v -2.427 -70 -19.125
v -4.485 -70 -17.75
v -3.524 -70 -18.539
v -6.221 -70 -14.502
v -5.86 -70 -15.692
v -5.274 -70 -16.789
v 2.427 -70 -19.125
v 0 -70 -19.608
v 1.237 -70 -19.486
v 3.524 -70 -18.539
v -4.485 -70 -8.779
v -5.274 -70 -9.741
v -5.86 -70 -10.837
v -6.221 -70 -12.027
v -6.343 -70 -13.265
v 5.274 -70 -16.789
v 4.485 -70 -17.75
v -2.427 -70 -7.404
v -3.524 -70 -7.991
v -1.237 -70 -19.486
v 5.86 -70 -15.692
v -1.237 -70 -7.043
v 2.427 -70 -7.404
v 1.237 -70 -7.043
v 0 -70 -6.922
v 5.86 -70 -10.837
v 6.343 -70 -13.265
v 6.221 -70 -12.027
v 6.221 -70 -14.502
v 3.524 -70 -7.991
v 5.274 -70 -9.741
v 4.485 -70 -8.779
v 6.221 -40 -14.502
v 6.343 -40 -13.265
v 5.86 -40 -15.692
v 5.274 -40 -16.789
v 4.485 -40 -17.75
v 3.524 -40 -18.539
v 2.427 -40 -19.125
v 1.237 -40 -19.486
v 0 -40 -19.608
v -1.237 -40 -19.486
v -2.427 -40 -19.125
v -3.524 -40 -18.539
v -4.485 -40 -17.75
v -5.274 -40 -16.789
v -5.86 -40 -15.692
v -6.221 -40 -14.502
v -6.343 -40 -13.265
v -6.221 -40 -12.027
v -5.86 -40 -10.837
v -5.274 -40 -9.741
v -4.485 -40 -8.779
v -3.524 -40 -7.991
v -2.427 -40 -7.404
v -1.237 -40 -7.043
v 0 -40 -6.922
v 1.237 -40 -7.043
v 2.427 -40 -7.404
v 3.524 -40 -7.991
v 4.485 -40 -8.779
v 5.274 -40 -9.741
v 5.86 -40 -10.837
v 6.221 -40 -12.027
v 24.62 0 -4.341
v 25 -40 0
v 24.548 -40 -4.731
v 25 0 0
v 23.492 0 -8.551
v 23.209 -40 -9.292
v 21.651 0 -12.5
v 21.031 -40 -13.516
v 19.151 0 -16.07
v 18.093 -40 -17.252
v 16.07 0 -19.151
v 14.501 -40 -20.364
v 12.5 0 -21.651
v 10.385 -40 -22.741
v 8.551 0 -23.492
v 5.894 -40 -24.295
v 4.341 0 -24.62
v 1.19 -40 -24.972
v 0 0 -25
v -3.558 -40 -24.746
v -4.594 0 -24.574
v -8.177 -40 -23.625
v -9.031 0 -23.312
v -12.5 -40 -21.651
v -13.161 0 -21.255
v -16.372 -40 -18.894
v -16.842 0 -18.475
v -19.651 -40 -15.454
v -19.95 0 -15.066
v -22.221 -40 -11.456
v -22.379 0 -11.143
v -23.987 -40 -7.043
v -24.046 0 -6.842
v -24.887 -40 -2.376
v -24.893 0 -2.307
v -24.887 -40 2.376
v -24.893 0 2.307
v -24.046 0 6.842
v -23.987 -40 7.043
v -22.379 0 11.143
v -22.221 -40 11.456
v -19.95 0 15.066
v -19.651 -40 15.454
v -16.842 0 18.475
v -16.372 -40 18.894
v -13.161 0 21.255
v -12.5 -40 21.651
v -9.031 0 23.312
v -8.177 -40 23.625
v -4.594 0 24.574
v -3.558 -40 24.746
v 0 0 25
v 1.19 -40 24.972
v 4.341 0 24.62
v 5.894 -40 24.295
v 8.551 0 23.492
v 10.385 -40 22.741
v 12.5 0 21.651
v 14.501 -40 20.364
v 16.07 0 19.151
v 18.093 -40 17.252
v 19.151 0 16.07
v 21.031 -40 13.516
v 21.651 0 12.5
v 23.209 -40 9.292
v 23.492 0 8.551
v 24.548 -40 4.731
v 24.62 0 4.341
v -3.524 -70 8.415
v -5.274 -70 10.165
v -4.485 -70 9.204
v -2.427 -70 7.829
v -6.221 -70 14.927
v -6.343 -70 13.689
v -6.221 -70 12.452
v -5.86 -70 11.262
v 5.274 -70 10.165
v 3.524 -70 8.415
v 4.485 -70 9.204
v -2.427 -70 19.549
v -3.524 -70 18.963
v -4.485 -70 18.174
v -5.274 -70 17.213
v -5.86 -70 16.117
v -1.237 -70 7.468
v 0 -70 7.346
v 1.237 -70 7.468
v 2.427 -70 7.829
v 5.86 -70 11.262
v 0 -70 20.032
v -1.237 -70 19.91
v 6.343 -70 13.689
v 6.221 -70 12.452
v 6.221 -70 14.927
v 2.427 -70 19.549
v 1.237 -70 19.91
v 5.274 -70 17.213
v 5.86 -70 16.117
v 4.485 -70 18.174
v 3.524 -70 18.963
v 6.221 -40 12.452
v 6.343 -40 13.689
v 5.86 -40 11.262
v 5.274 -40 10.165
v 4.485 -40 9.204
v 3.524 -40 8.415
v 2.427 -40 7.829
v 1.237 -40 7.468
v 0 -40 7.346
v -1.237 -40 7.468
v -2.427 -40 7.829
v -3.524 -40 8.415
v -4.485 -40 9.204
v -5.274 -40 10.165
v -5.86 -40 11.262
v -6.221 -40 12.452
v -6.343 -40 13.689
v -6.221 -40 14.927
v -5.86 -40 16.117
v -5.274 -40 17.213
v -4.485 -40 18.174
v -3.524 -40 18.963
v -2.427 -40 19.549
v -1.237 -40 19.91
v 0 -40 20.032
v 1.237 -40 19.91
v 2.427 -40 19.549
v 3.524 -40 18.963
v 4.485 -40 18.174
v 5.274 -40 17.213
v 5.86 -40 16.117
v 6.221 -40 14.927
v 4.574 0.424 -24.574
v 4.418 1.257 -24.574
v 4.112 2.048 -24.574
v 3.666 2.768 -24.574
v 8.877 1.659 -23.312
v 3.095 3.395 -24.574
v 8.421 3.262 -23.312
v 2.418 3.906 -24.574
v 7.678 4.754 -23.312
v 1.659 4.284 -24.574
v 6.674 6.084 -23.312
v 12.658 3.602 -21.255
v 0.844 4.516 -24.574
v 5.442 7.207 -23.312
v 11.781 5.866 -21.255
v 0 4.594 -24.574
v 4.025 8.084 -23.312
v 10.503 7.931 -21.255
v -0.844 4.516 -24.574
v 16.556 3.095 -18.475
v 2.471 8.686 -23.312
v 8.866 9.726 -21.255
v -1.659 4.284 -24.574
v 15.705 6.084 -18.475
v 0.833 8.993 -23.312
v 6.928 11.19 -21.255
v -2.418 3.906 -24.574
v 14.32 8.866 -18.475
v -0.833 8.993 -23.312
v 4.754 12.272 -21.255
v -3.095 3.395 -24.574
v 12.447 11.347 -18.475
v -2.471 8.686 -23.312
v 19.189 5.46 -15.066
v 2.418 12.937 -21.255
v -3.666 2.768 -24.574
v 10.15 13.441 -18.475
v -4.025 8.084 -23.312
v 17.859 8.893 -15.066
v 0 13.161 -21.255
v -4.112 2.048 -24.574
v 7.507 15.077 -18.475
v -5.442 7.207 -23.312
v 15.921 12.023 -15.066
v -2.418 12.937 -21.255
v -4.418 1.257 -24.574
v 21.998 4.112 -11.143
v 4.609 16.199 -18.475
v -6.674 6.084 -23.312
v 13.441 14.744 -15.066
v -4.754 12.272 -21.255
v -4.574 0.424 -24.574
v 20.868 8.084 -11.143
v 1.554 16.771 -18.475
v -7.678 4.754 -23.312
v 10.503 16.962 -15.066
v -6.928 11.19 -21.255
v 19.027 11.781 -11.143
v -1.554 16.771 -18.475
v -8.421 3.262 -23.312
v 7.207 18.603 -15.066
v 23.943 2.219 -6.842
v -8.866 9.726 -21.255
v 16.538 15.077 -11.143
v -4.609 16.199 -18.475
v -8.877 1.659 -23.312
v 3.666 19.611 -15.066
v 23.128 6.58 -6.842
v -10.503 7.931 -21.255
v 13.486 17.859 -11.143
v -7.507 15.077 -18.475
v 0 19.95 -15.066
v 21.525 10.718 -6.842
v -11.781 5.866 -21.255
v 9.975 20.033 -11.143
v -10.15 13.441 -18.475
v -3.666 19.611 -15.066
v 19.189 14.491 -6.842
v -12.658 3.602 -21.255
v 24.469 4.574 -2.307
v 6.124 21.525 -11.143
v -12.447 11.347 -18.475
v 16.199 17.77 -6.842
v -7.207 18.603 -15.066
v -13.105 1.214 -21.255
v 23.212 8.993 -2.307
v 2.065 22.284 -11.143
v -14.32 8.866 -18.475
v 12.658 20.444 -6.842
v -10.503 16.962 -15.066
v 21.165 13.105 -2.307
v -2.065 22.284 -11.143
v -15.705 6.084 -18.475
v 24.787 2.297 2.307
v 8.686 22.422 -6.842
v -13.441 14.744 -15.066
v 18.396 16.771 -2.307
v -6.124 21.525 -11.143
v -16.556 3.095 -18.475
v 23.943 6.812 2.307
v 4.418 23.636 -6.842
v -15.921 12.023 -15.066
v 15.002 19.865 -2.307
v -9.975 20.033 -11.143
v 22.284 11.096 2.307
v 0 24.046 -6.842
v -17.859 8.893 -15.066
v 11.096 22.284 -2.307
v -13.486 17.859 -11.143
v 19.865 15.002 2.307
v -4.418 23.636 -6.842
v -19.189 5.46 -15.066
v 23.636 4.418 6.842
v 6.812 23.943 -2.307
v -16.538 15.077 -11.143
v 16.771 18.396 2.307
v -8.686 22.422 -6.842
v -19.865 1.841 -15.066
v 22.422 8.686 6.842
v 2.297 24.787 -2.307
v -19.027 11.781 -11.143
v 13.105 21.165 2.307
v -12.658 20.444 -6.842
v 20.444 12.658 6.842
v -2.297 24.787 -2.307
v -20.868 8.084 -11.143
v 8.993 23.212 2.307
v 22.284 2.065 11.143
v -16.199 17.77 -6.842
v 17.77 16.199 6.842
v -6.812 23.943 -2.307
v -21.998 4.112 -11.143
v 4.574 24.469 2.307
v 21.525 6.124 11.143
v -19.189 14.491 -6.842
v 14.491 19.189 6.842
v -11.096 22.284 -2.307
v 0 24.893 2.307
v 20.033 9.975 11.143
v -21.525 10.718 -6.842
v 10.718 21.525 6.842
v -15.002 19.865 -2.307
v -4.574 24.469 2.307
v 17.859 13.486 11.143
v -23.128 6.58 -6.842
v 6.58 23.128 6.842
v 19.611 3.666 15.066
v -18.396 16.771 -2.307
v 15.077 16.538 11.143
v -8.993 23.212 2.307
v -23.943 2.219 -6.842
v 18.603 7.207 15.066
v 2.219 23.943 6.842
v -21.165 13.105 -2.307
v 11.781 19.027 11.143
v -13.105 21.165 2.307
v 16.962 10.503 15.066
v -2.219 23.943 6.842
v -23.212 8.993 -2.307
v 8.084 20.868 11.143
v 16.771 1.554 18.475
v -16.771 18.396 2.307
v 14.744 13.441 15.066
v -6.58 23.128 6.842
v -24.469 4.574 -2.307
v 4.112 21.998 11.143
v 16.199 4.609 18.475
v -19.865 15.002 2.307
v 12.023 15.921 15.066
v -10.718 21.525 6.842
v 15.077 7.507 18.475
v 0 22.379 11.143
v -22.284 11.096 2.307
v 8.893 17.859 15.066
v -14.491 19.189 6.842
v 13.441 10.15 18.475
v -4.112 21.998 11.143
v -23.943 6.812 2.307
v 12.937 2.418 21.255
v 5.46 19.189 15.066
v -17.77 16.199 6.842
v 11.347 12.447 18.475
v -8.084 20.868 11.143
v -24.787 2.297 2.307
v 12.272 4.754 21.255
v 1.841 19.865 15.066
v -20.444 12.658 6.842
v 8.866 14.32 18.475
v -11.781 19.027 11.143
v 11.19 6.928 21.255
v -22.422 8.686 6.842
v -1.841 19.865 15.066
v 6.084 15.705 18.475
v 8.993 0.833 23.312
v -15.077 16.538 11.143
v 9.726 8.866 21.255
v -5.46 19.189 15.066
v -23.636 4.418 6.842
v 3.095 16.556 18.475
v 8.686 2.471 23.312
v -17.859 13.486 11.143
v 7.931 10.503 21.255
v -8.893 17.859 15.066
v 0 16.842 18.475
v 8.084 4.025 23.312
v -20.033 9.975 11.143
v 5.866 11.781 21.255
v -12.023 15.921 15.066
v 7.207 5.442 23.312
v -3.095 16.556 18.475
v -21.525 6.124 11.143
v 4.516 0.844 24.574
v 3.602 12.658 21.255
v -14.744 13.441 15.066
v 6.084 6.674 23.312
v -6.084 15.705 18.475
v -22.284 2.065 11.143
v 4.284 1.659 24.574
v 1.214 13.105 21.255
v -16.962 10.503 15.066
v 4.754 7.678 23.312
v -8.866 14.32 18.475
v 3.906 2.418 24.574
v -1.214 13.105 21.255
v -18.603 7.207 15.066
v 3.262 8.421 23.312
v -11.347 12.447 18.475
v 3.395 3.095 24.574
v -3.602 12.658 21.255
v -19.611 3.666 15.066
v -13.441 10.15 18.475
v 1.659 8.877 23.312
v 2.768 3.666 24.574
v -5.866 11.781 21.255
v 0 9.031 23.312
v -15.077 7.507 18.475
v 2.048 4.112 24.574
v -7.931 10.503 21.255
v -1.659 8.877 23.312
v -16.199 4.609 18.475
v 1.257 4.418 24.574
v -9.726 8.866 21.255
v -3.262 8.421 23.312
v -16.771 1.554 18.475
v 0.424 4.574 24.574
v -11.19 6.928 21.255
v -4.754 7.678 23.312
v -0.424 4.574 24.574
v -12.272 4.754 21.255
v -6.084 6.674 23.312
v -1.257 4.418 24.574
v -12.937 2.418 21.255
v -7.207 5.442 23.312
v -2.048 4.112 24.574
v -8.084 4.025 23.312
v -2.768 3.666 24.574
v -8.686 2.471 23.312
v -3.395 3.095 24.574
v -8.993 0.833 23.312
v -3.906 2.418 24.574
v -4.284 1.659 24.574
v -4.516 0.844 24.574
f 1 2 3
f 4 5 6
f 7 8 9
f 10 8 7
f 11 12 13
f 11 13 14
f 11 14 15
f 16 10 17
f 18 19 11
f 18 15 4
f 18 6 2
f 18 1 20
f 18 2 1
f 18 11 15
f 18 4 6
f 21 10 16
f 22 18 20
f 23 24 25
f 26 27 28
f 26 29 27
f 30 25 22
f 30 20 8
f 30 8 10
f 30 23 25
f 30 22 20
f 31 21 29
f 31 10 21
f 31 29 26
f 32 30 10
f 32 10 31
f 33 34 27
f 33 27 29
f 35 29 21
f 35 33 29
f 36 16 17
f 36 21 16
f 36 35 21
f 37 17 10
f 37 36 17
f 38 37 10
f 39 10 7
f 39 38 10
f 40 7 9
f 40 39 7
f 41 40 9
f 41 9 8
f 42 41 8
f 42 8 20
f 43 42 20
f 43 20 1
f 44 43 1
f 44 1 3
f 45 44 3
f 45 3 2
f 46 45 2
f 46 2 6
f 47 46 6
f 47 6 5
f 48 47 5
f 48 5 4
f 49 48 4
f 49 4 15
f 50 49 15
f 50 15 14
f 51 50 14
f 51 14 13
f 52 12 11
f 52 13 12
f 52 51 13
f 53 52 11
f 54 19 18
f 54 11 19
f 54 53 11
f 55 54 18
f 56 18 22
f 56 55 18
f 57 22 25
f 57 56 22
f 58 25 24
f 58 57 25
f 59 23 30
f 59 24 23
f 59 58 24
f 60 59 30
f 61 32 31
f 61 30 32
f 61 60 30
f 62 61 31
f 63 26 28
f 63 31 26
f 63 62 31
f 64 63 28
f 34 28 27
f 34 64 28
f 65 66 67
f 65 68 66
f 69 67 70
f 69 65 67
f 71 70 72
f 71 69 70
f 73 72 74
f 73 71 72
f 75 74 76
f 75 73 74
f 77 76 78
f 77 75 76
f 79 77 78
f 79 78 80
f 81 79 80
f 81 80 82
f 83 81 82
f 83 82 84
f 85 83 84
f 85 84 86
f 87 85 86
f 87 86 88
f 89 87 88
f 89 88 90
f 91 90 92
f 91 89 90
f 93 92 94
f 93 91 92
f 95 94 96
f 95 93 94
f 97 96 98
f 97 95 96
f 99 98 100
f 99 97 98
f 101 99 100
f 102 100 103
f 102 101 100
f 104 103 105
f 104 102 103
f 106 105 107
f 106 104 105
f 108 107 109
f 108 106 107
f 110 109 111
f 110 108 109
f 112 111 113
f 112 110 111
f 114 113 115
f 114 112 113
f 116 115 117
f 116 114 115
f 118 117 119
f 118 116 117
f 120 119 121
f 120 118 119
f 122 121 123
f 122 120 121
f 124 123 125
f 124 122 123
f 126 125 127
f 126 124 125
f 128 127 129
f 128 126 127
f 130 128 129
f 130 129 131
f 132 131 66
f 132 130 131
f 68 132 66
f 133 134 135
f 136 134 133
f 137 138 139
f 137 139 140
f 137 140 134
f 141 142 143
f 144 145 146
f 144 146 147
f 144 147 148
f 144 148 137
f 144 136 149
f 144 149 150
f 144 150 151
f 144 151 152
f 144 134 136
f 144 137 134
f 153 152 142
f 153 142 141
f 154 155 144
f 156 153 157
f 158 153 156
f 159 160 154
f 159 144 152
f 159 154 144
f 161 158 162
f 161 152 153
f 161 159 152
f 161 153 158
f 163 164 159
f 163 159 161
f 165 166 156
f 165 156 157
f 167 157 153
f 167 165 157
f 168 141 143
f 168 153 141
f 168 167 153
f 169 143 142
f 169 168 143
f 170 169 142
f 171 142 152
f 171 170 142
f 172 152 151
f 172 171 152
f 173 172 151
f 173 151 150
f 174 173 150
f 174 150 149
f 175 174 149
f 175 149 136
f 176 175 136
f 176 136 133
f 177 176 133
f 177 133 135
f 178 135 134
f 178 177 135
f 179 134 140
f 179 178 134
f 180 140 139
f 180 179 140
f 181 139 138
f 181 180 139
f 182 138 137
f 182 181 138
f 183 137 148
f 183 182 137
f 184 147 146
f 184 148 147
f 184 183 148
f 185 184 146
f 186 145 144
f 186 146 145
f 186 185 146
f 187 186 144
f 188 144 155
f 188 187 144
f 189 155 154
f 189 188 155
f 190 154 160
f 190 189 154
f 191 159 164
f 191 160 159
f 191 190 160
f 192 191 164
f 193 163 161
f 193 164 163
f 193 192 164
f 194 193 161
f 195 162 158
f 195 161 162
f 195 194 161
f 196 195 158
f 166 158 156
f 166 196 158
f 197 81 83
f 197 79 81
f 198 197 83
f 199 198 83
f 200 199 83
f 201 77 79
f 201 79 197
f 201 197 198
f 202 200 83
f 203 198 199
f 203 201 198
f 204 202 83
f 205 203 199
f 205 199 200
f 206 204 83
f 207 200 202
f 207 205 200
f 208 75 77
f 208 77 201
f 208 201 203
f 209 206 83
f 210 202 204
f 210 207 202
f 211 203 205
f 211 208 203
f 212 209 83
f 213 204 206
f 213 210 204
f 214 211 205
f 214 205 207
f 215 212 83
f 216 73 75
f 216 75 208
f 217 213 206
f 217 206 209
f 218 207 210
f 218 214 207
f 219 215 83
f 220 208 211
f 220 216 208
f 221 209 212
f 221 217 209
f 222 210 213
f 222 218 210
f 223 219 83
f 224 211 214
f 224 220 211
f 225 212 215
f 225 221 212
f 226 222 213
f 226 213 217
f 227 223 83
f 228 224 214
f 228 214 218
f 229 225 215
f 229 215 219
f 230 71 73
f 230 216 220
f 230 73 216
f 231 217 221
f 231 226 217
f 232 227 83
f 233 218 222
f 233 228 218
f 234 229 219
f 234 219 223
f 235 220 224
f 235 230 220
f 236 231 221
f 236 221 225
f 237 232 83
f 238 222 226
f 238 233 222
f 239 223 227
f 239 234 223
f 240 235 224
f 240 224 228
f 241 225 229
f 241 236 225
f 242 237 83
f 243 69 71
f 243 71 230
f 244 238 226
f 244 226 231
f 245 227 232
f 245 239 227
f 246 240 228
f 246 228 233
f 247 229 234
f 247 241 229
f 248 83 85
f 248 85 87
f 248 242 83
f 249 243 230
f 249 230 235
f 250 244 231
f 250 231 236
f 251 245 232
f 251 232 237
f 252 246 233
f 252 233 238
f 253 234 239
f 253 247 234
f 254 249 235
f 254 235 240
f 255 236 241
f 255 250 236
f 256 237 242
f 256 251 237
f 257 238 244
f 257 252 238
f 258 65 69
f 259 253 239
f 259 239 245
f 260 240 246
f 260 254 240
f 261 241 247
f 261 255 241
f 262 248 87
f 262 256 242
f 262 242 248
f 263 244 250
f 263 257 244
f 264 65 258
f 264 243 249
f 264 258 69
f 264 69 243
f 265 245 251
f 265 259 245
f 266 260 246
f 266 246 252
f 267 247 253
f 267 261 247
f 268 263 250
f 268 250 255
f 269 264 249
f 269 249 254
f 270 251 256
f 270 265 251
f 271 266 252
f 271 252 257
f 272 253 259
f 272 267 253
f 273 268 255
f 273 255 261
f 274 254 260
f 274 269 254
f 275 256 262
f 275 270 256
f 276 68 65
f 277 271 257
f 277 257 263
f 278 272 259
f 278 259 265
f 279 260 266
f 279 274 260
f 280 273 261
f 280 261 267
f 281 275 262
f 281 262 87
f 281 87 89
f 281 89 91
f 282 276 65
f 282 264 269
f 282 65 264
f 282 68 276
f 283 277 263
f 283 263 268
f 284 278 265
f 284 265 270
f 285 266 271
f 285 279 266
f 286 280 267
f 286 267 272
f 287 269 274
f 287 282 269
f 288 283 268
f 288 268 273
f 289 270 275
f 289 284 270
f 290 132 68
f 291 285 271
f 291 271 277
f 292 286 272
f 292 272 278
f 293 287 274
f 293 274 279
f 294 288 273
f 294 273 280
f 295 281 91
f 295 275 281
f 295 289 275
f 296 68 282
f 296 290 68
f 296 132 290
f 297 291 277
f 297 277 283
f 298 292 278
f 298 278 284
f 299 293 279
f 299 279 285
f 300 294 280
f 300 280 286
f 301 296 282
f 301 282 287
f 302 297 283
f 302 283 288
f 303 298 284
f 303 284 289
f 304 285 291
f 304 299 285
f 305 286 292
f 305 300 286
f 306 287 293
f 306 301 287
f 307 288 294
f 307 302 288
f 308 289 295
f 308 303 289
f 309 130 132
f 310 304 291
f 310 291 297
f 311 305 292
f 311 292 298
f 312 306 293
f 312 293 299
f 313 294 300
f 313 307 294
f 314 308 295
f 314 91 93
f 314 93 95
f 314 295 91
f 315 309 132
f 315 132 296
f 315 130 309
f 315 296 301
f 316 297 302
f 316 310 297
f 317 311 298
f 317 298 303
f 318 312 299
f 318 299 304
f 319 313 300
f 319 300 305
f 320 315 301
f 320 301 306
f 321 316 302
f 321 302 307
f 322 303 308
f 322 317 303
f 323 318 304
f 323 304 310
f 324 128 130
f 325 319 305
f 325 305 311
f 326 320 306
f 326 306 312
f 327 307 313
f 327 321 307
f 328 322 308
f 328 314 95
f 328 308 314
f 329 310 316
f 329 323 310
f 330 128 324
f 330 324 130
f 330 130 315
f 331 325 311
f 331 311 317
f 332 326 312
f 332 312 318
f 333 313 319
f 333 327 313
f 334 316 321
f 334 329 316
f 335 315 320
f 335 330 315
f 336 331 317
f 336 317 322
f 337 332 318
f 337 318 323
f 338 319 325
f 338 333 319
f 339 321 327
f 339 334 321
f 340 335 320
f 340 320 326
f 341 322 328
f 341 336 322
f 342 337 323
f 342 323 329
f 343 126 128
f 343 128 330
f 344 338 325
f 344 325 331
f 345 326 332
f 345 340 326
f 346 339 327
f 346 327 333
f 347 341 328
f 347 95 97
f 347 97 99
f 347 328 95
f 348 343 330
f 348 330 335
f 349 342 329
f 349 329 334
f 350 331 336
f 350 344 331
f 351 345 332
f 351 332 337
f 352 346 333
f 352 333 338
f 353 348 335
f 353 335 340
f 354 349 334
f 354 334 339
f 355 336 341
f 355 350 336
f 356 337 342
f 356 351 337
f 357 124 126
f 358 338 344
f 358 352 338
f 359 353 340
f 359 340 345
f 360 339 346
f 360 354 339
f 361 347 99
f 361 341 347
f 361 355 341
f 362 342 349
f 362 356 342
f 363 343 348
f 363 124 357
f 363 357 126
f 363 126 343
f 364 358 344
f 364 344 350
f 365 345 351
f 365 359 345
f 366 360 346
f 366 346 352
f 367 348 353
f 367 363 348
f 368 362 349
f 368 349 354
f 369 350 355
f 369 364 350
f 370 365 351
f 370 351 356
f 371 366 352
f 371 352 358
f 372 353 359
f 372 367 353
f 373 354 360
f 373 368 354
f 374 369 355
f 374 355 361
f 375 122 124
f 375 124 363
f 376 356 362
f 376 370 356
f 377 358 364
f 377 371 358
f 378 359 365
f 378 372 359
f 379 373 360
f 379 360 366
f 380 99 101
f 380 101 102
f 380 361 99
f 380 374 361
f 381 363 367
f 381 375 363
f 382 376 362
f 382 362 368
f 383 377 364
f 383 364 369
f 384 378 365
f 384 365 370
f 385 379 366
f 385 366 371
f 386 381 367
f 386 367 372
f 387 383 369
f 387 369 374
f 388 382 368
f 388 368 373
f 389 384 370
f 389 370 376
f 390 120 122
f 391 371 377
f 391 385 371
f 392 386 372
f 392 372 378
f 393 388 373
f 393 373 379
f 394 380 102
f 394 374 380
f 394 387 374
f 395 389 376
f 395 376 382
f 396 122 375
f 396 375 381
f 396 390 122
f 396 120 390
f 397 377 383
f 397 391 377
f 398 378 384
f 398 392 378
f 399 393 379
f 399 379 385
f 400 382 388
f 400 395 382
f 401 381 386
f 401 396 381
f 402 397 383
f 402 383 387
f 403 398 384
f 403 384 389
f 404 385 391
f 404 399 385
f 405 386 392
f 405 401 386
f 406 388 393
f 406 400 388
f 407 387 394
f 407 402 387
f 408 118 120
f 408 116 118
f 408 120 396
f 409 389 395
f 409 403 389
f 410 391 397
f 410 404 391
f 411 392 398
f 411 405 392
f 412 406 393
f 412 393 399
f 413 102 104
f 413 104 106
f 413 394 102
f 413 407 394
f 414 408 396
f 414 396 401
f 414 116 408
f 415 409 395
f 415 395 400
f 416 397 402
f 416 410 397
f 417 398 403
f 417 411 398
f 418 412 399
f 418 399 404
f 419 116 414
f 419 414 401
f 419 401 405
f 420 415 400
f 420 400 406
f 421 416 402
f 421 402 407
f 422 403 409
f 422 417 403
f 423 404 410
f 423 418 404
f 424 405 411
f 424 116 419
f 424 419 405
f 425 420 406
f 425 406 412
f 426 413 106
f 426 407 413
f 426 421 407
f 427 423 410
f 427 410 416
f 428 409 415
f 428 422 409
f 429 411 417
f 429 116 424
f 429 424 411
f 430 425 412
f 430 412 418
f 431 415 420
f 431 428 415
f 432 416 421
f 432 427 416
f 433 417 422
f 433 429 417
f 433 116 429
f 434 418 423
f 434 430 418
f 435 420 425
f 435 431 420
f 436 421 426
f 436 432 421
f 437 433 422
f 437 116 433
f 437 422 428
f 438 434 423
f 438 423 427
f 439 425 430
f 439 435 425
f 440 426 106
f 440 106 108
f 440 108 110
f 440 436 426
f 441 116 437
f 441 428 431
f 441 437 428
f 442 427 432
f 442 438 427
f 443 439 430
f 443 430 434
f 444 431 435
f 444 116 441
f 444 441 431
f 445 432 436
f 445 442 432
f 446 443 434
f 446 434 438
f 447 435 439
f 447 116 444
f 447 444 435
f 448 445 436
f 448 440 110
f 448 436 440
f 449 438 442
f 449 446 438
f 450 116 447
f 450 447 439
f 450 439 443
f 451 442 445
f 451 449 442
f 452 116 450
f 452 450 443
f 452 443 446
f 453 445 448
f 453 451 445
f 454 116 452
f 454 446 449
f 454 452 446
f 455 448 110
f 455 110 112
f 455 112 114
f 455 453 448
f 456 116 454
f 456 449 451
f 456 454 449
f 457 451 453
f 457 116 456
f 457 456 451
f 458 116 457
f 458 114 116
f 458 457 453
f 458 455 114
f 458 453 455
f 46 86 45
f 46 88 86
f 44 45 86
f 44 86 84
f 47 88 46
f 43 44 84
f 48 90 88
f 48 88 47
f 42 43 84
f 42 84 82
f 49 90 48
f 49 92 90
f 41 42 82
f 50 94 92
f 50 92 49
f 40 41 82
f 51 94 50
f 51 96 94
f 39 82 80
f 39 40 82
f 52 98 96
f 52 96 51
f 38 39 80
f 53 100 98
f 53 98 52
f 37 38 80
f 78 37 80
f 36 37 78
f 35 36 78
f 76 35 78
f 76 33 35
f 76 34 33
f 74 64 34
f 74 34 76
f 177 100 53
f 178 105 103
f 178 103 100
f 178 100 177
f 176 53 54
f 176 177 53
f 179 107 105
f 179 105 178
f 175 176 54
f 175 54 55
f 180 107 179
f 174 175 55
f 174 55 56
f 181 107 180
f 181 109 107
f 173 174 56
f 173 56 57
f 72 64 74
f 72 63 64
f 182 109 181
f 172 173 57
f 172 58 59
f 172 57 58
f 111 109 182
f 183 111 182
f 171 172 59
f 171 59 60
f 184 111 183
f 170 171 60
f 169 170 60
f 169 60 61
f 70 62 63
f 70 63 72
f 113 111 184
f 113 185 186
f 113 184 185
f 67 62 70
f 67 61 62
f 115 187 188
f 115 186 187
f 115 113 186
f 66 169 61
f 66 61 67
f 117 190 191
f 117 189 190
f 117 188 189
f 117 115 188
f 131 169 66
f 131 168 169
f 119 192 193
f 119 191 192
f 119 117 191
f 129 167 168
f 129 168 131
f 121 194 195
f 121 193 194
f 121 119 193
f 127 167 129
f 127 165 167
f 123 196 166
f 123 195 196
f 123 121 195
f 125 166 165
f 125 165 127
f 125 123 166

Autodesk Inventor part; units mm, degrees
ref_plane "YZ Plane" through (0, 0, 0) normal (1, 0, 0) x (0, 1, 0)
ref_plane "XZ Plane" through (0, 0, 0) normal (0, 1, 0) x (-1, 0, 0)
ref_plane "XY Plane" through (0, 0, 0) normal (0, 0, 1) x (1, 0, 0)
sketch "Sketch1" plane through (0, 0, 0) normal (0, 1, 0) x (-1, 0, 0)
  arc A0 (0, -25) -> (0, 25) centre (0, 0) ccw
  line L0 (0, 25) -> (0, -25)
  dimension "d0" = 50
revolve "Revolution1" add sketch "Sketch1" angle 180 about axis through (0, 0, 25) along (0, 0, -1)
sketch "Sketch2" plane through (0, 0, 0) normal (0, -1, 0) x (1, 0, 0)
  circle A0 centre (0, 0) radius 25
extrude "Extrusion1" add sketch "Sketch2" along normal blind 40
sketch "Sketch3" plane through (0, -40, 0) normal (0, -1, 0) x (1, 0, 0)
  circle A0 centre (0, 13.6892) radius 6.3431
  circle A1 centre (0, -13.2647) radius 6.3431
  point P0 (0, 0)
extrude "Extrusion2" add sketch "Sketch3" along normal blind 30
properties part number "yellow led now"
